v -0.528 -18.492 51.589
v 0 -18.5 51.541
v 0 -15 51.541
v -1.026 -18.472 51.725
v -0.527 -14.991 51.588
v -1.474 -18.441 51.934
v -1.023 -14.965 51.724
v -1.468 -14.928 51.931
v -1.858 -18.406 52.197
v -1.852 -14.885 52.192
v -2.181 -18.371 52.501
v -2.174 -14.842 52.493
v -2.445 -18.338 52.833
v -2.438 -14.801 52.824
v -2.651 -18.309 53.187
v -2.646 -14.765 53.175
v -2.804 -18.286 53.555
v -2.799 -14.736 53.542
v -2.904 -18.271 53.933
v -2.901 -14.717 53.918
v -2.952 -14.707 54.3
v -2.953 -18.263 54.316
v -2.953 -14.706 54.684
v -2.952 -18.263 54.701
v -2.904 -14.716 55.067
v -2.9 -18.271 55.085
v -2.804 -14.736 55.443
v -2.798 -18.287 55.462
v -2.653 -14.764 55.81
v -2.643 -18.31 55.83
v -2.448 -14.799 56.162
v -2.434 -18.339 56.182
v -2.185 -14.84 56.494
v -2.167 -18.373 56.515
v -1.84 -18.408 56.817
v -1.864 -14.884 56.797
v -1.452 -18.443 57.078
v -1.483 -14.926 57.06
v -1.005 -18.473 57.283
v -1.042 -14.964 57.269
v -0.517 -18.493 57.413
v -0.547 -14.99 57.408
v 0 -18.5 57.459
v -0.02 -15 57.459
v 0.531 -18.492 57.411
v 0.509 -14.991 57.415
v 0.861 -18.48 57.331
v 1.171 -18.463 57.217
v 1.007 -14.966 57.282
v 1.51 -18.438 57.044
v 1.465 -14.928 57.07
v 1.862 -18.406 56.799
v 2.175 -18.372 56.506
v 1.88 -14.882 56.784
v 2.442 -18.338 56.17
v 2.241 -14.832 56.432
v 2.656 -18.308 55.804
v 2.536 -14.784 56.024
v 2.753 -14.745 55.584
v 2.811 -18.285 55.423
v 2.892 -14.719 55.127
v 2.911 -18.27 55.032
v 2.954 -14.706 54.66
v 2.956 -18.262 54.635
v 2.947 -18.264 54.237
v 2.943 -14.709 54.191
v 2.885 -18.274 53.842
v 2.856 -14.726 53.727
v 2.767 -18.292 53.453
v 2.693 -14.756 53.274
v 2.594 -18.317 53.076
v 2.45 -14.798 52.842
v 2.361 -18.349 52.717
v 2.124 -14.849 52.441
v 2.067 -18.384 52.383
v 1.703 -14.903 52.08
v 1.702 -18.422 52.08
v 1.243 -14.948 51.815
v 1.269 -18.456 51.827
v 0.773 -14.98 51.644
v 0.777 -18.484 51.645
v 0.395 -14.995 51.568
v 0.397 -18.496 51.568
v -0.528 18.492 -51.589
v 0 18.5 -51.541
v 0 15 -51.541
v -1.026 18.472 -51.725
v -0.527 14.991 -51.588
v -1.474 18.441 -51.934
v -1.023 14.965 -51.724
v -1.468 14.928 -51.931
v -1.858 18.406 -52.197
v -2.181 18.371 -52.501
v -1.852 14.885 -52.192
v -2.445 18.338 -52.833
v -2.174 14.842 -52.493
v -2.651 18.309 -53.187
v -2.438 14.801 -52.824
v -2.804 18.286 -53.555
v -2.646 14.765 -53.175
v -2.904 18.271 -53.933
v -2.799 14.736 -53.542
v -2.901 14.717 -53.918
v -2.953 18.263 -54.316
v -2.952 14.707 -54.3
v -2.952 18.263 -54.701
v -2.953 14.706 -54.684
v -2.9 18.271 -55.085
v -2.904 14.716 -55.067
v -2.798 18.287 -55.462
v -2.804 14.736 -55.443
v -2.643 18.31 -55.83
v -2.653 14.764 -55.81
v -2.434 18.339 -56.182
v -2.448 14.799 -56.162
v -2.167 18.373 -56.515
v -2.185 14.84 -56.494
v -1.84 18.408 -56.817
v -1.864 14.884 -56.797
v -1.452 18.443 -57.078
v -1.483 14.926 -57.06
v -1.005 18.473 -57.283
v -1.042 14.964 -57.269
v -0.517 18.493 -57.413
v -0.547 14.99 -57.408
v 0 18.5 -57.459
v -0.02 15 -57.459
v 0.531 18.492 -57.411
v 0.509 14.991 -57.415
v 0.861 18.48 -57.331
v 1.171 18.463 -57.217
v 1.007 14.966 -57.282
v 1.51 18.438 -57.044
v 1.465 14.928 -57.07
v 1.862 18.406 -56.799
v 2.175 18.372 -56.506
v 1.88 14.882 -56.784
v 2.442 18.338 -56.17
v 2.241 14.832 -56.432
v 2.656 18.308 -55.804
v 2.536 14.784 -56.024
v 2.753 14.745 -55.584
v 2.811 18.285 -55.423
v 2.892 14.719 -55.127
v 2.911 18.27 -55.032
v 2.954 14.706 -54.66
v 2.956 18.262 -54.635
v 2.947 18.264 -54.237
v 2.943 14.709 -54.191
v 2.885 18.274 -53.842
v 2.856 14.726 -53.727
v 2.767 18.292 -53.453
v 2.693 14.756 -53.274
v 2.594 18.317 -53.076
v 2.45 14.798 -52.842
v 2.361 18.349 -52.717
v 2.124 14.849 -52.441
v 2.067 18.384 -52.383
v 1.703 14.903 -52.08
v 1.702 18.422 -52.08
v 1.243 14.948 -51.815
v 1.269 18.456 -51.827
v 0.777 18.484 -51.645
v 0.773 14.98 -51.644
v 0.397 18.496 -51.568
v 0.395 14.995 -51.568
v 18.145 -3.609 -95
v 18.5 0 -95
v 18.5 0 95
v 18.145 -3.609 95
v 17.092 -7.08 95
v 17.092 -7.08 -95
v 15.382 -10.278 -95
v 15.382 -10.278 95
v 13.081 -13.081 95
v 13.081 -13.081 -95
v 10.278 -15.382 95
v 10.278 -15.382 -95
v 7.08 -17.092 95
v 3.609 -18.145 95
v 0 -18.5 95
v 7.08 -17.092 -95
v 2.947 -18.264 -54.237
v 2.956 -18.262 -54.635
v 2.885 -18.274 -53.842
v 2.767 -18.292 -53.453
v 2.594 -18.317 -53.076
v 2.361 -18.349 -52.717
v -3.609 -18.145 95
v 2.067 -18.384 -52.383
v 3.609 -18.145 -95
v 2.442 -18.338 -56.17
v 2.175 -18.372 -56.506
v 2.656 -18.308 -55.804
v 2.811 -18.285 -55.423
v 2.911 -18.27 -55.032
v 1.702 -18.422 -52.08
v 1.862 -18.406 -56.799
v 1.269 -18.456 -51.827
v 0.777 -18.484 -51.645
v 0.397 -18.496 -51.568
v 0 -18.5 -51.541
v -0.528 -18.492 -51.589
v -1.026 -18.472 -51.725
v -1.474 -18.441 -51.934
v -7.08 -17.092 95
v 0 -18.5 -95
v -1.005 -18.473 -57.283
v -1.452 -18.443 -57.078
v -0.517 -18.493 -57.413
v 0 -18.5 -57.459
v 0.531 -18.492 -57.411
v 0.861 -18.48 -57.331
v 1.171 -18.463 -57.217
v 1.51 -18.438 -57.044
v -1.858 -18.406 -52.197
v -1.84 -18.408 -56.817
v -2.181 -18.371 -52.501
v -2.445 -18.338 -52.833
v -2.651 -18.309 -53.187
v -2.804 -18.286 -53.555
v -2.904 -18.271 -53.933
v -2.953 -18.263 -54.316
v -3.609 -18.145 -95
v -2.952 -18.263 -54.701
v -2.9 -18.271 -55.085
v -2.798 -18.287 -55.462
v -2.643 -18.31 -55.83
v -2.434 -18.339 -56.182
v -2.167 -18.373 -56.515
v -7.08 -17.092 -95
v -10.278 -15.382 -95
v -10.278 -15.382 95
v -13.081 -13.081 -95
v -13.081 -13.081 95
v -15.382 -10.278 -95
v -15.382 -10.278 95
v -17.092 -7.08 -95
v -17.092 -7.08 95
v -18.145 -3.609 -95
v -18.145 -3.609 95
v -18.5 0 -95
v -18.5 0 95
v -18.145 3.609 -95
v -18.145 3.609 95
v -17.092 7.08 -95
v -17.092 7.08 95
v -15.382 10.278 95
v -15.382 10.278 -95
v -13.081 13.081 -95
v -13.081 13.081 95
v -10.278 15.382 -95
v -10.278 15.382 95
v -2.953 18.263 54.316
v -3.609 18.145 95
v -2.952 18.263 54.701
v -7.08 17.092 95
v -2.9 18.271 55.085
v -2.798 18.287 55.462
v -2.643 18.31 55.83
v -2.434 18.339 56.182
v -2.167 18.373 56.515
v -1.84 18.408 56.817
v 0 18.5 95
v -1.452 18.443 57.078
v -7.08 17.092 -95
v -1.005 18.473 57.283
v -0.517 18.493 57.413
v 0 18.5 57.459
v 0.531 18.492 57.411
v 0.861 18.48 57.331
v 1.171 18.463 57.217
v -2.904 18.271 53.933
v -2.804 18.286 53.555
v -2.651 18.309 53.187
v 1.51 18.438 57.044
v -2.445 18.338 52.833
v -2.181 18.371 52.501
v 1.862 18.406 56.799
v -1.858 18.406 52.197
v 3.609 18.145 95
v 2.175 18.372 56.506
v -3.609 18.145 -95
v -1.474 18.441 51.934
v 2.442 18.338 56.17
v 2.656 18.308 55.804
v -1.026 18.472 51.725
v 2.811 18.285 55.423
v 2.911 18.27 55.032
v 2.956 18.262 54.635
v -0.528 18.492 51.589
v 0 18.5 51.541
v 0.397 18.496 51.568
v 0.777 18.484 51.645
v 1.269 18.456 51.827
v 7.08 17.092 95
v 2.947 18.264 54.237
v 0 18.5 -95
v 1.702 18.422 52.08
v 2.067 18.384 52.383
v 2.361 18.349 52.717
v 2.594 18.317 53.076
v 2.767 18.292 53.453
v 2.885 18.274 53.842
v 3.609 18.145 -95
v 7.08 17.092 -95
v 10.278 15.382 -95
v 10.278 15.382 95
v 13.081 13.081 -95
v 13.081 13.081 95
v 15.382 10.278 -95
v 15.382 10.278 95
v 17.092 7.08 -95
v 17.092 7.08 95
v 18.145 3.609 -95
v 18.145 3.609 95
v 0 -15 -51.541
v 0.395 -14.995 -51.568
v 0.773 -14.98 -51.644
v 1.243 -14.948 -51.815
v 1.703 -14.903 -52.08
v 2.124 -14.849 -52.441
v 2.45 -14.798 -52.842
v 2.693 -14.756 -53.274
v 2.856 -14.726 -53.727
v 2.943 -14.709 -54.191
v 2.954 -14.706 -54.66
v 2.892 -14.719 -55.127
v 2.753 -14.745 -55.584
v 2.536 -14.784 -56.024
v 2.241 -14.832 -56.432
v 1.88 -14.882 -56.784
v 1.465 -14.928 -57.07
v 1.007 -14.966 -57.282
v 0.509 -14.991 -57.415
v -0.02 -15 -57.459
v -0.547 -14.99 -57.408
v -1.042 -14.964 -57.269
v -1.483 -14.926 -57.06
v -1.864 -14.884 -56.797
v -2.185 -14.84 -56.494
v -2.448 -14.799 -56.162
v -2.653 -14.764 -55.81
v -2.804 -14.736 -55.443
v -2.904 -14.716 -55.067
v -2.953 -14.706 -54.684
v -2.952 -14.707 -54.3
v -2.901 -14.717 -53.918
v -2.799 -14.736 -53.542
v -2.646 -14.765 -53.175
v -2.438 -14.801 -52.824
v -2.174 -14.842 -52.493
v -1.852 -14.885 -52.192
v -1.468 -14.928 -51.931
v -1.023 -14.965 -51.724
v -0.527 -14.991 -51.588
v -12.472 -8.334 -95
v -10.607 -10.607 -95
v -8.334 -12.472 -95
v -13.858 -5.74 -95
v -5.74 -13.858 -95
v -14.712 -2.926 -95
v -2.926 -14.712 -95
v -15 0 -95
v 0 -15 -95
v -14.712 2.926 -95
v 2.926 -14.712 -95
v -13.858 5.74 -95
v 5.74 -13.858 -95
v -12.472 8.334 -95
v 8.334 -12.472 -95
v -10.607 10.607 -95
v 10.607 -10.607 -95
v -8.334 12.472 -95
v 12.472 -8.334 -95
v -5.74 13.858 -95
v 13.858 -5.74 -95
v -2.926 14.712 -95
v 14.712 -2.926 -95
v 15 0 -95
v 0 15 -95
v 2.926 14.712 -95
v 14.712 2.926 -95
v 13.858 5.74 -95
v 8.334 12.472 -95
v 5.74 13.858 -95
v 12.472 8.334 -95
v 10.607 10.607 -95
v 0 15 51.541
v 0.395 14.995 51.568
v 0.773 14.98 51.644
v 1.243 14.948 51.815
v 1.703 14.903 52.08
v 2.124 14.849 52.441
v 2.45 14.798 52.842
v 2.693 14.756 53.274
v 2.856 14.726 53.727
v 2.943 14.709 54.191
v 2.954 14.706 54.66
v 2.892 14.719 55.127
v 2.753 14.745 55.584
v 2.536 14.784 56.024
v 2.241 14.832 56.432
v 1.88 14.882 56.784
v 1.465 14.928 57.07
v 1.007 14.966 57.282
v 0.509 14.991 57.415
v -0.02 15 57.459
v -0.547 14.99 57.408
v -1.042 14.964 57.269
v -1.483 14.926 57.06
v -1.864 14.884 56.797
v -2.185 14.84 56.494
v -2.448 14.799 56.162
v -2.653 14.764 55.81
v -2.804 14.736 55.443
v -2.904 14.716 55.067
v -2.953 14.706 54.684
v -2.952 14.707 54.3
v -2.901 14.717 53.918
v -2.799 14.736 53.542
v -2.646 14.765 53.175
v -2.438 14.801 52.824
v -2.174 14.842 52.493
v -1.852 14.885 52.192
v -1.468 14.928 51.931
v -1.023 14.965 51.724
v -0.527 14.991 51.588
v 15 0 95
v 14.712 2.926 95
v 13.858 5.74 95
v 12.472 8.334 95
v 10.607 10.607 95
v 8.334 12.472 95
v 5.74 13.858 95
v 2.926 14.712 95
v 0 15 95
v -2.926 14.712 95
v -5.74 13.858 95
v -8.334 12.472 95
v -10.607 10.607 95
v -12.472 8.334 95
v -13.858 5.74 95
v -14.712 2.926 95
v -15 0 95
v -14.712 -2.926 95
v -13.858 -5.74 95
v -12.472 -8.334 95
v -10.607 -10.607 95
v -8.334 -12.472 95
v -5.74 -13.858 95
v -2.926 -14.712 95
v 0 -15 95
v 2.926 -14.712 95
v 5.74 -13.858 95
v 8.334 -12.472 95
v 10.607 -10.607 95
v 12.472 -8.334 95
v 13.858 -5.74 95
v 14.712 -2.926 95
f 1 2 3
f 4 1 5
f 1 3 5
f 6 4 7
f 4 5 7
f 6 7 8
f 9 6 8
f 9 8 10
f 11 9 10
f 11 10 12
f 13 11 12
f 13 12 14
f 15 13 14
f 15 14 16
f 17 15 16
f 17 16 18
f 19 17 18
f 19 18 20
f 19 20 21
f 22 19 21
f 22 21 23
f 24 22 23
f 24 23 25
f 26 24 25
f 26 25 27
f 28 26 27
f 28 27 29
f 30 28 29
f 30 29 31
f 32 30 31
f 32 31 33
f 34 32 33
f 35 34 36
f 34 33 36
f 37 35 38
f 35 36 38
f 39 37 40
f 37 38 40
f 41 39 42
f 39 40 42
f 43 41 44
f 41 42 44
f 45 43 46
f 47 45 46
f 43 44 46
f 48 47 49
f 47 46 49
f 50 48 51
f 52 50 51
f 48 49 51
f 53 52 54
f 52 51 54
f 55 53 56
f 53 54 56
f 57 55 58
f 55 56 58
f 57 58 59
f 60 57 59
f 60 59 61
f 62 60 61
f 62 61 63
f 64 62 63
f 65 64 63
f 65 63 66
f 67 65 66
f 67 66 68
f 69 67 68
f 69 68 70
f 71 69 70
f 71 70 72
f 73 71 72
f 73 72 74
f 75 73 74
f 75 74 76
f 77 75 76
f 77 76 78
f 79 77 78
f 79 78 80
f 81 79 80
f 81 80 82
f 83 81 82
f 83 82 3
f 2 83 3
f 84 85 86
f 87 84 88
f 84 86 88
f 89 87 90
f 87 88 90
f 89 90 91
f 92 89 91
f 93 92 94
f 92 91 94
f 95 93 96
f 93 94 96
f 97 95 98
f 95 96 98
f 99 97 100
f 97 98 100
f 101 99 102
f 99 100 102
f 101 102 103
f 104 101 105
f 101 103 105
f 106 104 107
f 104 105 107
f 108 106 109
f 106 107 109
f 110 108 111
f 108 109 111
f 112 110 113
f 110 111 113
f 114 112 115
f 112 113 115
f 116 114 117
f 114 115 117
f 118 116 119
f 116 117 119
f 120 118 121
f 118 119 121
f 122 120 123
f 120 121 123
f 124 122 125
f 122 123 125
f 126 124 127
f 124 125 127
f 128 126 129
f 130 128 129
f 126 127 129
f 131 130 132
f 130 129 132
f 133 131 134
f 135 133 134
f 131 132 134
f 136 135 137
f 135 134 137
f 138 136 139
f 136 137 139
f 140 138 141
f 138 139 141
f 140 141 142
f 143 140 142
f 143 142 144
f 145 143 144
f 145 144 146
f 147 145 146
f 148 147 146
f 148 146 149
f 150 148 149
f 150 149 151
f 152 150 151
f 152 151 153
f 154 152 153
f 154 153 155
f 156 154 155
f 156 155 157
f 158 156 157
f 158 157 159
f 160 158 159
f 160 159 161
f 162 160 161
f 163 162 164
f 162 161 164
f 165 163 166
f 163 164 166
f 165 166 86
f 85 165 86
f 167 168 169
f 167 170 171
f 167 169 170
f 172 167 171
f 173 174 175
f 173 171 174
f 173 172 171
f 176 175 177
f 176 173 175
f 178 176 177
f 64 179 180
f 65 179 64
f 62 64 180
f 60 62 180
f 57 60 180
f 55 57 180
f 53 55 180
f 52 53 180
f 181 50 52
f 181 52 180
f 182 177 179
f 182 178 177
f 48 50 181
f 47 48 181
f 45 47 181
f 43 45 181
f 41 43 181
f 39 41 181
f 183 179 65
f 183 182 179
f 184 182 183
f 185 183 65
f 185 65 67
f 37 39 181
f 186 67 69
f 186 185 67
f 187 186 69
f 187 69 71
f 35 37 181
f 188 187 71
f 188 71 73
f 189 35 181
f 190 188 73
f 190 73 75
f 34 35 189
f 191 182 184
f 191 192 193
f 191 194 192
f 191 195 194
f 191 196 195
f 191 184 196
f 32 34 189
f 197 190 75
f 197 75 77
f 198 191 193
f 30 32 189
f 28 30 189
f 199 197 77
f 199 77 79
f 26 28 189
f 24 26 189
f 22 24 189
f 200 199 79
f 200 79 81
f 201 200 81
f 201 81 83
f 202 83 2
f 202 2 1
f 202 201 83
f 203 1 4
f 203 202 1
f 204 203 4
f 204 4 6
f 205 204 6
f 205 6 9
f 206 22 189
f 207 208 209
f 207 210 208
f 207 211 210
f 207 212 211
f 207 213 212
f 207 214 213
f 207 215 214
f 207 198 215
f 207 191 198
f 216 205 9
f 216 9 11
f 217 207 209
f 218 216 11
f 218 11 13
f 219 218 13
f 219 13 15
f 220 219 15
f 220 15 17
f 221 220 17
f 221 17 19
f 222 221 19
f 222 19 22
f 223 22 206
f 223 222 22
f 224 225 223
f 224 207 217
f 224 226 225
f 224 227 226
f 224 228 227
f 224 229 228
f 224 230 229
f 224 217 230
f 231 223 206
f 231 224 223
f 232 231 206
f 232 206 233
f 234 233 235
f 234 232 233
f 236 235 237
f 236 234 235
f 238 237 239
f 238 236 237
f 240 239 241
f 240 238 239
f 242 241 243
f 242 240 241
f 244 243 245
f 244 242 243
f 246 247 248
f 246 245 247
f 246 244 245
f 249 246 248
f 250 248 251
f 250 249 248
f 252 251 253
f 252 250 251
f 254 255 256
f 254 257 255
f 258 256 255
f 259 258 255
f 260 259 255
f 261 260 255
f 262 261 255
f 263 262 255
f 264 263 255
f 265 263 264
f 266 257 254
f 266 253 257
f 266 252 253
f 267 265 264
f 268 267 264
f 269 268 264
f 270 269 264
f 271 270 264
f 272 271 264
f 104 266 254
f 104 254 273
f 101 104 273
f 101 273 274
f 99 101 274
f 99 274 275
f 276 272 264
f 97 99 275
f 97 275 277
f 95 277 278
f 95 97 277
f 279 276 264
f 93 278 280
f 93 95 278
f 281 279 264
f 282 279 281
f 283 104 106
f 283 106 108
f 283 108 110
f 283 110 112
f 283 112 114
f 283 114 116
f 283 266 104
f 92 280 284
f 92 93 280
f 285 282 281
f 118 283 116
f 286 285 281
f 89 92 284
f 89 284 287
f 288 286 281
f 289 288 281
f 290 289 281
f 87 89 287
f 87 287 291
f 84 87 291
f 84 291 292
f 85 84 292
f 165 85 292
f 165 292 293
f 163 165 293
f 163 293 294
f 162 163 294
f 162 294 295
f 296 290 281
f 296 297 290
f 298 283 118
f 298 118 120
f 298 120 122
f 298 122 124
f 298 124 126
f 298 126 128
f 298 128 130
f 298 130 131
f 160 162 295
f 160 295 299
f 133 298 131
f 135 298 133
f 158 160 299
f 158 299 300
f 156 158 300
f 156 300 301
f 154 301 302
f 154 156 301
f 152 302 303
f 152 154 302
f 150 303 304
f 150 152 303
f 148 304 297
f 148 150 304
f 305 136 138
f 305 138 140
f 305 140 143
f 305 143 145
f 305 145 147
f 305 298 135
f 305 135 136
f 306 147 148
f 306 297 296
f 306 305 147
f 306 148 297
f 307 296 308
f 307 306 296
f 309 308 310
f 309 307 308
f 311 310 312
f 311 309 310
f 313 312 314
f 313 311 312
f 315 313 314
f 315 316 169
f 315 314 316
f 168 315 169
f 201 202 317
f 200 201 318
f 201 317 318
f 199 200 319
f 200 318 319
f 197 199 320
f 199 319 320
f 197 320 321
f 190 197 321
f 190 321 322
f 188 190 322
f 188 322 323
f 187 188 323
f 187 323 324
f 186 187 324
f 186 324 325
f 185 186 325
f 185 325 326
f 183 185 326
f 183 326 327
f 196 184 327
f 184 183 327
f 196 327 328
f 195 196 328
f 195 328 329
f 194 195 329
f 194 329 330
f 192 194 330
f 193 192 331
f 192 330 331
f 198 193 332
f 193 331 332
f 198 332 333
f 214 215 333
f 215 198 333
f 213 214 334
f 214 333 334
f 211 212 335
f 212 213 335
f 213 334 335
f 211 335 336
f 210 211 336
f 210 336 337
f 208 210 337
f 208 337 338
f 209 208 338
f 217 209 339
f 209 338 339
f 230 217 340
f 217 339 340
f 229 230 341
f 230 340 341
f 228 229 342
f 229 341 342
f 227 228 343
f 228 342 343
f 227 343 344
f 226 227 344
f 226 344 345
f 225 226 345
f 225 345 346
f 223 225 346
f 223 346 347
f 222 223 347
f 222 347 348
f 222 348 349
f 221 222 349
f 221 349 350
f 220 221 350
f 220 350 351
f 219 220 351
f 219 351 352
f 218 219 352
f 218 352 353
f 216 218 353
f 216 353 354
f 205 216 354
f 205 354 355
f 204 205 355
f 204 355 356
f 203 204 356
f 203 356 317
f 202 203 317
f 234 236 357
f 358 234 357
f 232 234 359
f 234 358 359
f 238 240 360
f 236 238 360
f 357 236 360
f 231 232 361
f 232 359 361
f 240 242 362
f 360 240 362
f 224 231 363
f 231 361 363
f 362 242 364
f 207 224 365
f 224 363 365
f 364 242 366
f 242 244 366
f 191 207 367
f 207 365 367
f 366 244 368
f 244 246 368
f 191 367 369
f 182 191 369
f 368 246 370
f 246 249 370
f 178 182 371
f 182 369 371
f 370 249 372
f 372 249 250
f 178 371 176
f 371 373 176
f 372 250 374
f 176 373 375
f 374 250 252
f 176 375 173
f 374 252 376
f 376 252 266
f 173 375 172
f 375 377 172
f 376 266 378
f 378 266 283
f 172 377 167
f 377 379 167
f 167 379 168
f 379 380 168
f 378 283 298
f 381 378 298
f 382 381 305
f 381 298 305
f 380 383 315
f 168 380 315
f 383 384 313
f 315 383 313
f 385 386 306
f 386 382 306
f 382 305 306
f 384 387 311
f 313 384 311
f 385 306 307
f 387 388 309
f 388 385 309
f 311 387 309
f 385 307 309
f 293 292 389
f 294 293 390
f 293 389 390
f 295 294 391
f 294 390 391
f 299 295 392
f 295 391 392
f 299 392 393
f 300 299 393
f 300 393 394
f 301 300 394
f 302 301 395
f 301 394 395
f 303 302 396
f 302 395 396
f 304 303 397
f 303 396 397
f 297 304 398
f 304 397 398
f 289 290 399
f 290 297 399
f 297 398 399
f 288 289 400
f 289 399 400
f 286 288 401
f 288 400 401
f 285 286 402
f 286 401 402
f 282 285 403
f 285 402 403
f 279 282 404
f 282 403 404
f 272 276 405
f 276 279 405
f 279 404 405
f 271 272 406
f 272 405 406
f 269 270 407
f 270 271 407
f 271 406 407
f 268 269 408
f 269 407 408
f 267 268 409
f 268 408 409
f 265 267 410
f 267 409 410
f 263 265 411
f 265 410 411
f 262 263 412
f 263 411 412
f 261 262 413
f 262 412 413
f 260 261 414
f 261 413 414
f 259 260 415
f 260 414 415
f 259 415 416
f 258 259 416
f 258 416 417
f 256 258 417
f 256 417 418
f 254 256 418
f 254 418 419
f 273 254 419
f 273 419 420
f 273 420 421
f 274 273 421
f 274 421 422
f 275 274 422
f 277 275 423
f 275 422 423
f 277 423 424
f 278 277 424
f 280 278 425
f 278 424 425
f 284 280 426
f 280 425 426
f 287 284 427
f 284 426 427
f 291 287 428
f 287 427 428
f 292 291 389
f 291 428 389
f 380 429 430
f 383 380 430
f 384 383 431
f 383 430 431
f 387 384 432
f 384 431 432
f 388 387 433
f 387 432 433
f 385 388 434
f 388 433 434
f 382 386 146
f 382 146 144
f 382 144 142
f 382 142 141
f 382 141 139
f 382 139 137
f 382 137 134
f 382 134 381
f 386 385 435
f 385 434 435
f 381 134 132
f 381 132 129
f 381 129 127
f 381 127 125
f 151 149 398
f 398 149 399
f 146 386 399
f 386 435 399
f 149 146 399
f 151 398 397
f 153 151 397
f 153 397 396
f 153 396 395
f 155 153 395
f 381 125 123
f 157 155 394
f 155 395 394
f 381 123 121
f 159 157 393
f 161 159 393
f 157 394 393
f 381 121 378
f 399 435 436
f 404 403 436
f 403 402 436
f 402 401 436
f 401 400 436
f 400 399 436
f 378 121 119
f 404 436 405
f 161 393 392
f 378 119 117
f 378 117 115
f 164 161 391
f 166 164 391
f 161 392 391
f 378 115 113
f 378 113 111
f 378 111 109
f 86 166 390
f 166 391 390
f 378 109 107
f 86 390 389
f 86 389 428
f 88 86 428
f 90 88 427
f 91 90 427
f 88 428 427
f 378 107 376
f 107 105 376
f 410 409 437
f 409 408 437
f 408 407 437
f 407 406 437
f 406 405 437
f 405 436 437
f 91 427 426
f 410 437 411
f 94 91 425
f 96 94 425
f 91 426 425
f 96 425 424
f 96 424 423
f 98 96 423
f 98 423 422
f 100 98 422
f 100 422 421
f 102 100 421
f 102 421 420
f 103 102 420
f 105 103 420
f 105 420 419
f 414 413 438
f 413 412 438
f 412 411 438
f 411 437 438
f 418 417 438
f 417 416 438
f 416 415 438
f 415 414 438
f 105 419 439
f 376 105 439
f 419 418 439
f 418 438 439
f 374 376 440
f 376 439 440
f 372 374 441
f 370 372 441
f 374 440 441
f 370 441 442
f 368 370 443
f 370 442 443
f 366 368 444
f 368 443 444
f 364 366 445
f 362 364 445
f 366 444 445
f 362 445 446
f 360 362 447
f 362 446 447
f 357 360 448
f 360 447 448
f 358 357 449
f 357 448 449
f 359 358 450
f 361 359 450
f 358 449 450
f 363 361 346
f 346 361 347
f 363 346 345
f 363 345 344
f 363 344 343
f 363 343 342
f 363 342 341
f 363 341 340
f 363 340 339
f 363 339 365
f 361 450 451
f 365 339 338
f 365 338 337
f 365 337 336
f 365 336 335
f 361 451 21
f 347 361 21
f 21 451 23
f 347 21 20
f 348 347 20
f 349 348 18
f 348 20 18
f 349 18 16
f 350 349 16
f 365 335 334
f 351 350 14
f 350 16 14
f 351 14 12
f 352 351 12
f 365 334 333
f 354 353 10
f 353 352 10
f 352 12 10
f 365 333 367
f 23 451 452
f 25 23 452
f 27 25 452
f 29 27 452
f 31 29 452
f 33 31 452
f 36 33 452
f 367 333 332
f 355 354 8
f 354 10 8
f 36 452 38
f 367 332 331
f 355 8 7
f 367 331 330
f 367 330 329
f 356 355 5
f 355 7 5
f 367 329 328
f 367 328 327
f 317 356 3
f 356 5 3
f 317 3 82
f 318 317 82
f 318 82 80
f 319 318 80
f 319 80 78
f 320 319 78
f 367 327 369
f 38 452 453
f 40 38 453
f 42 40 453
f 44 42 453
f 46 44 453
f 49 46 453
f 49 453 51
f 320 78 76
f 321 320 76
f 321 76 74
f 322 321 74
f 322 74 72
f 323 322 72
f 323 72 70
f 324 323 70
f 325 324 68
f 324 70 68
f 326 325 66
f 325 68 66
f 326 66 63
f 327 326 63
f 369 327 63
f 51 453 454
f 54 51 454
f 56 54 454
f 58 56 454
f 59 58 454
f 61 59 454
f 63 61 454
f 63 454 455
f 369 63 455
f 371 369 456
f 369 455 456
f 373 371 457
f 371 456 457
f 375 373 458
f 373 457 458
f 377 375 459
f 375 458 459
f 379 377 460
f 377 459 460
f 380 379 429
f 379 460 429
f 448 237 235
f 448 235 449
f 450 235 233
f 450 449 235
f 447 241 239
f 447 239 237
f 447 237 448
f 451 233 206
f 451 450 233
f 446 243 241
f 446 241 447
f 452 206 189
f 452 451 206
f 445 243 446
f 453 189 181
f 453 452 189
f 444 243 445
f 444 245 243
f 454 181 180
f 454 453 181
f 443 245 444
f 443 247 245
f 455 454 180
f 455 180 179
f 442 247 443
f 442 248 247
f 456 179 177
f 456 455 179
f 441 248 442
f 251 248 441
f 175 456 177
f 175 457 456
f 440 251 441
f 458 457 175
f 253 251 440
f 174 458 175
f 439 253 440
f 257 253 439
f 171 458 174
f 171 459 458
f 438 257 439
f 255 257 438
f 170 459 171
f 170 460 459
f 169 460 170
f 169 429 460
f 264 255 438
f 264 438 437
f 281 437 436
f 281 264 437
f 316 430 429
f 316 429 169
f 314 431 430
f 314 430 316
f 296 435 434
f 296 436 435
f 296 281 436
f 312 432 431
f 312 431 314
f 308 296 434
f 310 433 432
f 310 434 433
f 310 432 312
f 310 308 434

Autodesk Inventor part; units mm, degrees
ref_plane "YZ Plane" through (0, 0, 0) normal (1, 0, 0) x (0, 1, 0)
ref_plane "XZ Plane" through (0, 0, 0) normal (0, 1, 0) x (-1, 0, 0)
sketch "Sketch1" plane through (0, 0, 0) normal (0, 0, 1) x (1, 0, 0)
  circle A0 centre (0, 0) radius 18.5
  circle A1 centre (0, 0) radius 15
  dimension "d0" = 37
  dimension "d1" = 30
extrude "Extrusion1" add sketch "Sketch1" along normal mid plane 190
ref_plane "Work Plane4" through (0, 18.5, 0) normal (0, 1, 0) x (-1, 0, 0)
sketch "Sketch4" plane through (0, 18.5, 0) normal (0, 1, 0) x (-1, 0, 0)
  line L0 (-18.5, -95) -> (18.5, -95) projected
  line L1 (18.5, -95) -> (18.5, 95) projected
  line L2 (-18.5, -95) -> (18.5, -95) projected
  line L3 (18.5, 95) -> (-18.5, 95) projected
  point P0 (0, 0)
  point P1 (0, -54.5)
  dimension "d14" = 40.5
  dimension "d22" = 190
  dimension "d23" = 18.5
hole "Hole1" at (0, 18.5, -54.5) direction (0, -1, 0) diameter 5.9175 depth 19.1 tip angle 118 thread size "M7x1" class "6H" standard "ISO Metric profile"
mirror "Mirror1" about plane through (0, 0, 0) normal (0, 0, 1) of "Hole1"
mirror "Mirror2" about plane through (0, 0, 0) normal (0, 1, 0) of "Hole1", "Mirror1"
properties part number "EjeRodilla" material "PLA"
